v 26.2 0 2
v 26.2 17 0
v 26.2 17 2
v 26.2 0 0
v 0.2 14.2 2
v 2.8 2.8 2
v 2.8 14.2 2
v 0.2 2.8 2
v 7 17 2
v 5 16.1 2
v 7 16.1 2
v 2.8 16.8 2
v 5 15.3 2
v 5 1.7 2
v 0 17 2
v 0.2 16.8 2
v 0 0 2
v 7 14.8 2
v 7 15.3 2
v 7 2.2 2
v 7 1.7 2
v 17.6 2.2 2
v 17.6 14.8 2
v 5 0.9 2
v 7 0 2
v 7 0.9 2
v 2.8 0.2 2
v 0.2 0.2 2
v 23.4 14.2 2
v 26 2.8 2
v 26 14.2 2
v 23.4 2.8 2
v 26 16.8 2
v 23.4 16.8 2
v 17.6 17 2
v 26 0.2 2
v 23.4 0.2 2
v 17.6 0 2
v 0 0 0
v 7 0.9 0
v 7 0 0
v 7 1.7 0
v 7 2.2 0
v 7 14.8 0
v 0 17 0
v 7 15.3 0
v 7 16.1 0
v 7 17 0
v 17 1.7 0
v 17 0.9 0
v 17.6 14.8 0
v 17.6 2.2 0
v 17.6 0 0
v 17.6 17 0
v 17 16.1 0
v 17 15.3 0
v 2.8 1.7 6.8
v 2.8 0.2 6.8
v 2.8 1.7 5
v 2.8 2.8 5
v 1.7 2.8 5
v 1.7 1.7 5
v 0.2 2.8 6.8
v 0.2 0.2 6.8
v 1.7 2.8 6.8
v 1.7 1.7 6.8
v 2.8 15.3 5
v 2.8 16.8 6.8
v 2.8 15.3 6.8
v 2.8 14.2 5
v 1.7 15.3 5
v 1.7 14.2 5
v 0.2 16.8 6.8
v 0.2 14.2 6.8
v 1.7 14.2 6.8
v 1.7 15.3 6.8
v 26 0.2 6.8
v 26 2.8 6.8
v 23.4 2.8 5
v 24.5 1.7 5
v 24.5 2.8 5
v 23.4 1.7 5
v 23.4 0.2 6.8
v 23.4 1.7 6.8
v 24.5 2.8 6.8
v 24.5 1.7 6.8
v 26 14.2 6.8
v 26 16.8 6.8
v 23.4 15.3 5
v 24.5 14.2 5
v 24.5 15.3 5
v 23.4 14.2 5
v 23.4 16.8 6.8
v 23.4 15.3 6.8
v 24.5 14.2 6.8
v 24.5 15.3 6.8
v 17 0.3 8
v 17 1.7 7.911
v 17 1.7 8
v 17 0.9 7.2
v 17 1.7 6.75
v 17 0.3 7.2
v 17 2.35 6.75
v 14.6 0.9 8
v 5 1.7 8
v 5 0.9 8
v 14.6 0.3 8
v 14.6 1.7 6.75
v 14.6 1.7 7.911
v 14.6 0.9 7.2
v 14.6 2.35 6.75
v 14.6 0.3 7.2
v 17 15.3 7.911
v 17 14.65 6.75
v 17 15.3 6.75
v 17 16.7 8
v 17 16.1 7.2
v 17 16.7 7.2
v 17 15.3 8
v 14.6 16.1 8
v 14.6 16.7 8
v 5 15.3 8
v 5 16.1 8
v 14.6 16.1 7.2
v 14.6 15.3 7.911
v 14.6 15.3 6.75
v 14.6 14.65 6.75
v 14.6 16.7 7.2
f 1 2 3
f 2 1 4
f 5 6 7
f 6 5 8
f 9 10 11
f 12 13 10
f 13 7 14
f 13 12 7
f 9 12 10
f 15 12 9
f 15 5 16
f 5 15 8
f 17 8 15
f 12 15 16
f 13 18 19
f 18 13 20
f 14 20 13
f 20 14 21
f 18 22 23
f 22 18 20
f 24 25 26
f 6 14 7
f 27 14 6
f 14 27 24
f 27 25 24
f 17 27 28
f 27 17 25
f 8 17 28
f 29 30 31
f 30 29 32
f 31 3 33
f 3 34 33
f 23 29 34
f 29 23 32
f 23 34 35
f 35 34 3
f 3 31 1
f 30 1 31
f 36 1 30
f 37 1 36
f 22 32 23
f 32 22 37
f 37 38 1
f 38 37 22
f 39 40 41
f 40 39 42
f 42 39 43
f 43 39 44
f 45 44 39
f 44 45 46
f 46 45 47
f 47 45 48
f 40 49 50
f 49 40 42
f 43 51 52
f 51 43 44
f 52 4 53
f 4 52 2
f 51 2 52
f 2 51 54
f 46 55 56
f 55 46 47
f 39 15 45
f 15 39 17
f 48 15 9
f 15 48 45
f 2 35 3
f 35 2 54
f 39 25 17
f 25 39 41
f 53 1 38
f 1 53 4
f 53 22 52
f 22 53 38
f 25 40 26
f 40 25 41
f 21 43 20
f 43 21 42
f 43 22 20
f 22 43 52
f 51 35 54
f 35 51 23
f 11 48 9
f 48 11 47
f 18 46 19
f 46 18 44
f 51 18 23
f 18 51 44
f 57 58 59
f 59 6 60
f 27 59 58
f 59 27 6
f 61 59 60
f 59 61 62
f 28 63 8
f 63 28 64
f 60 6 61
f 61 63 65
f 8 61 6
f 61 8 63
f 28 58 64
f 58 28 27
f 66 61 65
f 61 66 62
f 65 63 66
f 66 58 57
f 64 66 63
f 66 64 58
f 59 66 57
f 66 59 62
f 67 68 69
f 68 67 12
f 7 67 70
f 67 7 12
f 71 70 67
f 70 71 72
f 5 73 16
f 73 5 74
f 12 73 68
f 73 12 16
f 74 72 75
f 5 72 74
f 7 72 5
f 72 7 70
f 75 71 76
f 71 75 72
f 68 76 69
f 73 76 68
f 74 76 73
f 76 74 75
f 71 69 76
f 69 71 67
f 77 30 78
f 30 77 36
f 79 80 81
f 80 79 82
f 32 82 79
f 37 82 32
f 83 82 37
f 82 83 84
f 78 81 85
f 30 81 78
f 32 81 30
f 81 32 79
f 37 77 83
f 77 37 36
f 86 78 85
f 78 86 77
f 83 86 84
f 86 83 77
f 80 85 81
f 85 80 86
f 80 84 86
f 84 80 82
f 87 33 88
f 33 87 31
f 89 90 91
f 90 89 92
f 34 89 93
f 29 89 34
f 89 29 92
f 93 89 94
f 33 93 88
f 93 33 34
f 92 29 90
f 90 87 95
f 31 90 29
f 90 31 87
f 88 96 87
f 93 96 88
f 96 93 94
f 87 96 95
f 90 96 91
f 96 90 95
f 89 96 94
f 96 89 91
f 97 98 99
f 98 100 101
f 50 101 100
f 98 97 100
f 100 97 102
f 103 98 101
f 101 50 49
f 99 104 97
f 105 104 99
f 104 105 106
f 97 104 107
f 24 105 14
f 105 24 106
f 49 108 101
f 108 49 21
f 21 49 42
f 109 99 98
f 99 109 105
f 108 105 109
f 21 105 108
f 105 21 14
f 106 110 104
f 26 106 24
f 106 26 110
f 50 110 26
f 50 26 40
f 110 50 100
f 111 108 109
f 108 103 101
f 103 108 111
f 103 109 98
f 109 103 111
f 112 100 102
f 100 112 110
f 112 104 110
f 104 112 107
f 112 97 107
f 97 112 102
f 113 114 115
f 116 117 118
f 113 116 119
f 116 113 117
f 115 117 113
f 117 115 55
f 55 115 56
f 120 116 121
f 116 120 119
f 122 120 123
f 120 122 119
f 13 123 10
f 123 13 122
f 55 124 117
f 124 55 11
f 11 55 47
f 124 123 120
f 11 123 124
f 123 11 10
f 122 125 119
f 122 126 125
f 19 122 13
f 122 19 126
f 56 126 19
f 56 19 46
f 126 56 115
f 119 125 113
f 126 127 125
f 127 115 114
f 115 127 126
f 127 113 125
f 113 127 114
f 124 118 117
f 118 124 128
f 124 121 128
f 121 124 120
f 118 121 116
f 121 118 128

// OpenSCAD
// Sample with flexible side latches, v0.8. Millimetres.
translate([-6.0, -16.0, 0]) union(){
difference(){
translate([6.0, 16.0, 0]) cube([26.2, 17.0, 2.0]);
translate([13.0, 15.9, -0.1]) cube([10.6, 2.3, 2.2]);
translate([13.0, 30.8, -0.1]) cube([10.6, 2.3, 2.2]);
}
union(){
translate([6.2, 16.2, 2.0]) cube([2.6, 2.6, 3.0]);
translate([6.2, 16.2, 2.0]) cube([1.5, 2.6, 4.8]);
translate([6.2, 16.2, 2.0]) cube([2.6, 1.5, 4.8]);
translate([6.2, 30.2, 2.0]) cube([2.6, 2.6, 3.0]);
translate([6.2, 30.2, 2.0]) cube([1.5, 2.6, 4.8]);
translate([6.2, 31.3, 2.0]) cube([2.6, 1.5, 4.8]);
translate([29.4, 16.2, 2.0]) cube([2.6, 2.6, 3.0]);
translate([30.5, 16.2, 2.0]) cube([1.5, 2.6, 4.8]);
translate([29.4, 16.2, 2.0]) cube([2.6, 1.5, 4.8]);
translate([29.4, 30.2, 2.0]) cube([2.6, 2.6, 3.0]);
translate([30.5, 30.2, 2.0]) cube([1.5, 2.6, 4.8]);
translate([29.4, 31.3, 2.0]) cube([2.6, 1.5, 4.8]);
}
union(){
translate([11.0, 16.9, 0]) cube([12.0, 0.8, 8.0]);
polyhedron(points=[[20.6, 18.35, 6.75], [23.0, 18.35, 6.75], [20.6, 17.65, 6.75], [23.0, 17.65, 6.75], [20.6, 17.65, 8.0], [23.0, 17.65, 8.0]],faces=[[0, 2, 4], [1, 5, 3], [0, 1, 3], [0, 3, 2], [2, 3, 5], [2, 5, 4], [4, 5, 1], [4, 1, 0]]);
translate([20.6, 16.299999999999997, 7.2]) cube([2.4, 0.65, 0.8]);
}
union(){
translate([11.0, 31.3, 0]) cube([12.0, 0.8, 8.0]);
polyhedron(points=[[20.6, 30.65, 6.75], [23.0, 30.65, 6.75], [20.6, 31.35, 6.75], [23.0, 31.35, 6.75], [20.6, 31.35, 8.0], [23.0, 31.35, 8.0]],faces=[[4, 2, 0], [3, 5, 1], [3, 1, 0], [2, 3, 0], [5, 3, 2], [4, 5, 2], [1, 5, 4], [0, 1, 4]]);
translate([20.6, 32.050000000000004, 7.2]) cube([2.4, 0.65, 0.8]);
}
}
